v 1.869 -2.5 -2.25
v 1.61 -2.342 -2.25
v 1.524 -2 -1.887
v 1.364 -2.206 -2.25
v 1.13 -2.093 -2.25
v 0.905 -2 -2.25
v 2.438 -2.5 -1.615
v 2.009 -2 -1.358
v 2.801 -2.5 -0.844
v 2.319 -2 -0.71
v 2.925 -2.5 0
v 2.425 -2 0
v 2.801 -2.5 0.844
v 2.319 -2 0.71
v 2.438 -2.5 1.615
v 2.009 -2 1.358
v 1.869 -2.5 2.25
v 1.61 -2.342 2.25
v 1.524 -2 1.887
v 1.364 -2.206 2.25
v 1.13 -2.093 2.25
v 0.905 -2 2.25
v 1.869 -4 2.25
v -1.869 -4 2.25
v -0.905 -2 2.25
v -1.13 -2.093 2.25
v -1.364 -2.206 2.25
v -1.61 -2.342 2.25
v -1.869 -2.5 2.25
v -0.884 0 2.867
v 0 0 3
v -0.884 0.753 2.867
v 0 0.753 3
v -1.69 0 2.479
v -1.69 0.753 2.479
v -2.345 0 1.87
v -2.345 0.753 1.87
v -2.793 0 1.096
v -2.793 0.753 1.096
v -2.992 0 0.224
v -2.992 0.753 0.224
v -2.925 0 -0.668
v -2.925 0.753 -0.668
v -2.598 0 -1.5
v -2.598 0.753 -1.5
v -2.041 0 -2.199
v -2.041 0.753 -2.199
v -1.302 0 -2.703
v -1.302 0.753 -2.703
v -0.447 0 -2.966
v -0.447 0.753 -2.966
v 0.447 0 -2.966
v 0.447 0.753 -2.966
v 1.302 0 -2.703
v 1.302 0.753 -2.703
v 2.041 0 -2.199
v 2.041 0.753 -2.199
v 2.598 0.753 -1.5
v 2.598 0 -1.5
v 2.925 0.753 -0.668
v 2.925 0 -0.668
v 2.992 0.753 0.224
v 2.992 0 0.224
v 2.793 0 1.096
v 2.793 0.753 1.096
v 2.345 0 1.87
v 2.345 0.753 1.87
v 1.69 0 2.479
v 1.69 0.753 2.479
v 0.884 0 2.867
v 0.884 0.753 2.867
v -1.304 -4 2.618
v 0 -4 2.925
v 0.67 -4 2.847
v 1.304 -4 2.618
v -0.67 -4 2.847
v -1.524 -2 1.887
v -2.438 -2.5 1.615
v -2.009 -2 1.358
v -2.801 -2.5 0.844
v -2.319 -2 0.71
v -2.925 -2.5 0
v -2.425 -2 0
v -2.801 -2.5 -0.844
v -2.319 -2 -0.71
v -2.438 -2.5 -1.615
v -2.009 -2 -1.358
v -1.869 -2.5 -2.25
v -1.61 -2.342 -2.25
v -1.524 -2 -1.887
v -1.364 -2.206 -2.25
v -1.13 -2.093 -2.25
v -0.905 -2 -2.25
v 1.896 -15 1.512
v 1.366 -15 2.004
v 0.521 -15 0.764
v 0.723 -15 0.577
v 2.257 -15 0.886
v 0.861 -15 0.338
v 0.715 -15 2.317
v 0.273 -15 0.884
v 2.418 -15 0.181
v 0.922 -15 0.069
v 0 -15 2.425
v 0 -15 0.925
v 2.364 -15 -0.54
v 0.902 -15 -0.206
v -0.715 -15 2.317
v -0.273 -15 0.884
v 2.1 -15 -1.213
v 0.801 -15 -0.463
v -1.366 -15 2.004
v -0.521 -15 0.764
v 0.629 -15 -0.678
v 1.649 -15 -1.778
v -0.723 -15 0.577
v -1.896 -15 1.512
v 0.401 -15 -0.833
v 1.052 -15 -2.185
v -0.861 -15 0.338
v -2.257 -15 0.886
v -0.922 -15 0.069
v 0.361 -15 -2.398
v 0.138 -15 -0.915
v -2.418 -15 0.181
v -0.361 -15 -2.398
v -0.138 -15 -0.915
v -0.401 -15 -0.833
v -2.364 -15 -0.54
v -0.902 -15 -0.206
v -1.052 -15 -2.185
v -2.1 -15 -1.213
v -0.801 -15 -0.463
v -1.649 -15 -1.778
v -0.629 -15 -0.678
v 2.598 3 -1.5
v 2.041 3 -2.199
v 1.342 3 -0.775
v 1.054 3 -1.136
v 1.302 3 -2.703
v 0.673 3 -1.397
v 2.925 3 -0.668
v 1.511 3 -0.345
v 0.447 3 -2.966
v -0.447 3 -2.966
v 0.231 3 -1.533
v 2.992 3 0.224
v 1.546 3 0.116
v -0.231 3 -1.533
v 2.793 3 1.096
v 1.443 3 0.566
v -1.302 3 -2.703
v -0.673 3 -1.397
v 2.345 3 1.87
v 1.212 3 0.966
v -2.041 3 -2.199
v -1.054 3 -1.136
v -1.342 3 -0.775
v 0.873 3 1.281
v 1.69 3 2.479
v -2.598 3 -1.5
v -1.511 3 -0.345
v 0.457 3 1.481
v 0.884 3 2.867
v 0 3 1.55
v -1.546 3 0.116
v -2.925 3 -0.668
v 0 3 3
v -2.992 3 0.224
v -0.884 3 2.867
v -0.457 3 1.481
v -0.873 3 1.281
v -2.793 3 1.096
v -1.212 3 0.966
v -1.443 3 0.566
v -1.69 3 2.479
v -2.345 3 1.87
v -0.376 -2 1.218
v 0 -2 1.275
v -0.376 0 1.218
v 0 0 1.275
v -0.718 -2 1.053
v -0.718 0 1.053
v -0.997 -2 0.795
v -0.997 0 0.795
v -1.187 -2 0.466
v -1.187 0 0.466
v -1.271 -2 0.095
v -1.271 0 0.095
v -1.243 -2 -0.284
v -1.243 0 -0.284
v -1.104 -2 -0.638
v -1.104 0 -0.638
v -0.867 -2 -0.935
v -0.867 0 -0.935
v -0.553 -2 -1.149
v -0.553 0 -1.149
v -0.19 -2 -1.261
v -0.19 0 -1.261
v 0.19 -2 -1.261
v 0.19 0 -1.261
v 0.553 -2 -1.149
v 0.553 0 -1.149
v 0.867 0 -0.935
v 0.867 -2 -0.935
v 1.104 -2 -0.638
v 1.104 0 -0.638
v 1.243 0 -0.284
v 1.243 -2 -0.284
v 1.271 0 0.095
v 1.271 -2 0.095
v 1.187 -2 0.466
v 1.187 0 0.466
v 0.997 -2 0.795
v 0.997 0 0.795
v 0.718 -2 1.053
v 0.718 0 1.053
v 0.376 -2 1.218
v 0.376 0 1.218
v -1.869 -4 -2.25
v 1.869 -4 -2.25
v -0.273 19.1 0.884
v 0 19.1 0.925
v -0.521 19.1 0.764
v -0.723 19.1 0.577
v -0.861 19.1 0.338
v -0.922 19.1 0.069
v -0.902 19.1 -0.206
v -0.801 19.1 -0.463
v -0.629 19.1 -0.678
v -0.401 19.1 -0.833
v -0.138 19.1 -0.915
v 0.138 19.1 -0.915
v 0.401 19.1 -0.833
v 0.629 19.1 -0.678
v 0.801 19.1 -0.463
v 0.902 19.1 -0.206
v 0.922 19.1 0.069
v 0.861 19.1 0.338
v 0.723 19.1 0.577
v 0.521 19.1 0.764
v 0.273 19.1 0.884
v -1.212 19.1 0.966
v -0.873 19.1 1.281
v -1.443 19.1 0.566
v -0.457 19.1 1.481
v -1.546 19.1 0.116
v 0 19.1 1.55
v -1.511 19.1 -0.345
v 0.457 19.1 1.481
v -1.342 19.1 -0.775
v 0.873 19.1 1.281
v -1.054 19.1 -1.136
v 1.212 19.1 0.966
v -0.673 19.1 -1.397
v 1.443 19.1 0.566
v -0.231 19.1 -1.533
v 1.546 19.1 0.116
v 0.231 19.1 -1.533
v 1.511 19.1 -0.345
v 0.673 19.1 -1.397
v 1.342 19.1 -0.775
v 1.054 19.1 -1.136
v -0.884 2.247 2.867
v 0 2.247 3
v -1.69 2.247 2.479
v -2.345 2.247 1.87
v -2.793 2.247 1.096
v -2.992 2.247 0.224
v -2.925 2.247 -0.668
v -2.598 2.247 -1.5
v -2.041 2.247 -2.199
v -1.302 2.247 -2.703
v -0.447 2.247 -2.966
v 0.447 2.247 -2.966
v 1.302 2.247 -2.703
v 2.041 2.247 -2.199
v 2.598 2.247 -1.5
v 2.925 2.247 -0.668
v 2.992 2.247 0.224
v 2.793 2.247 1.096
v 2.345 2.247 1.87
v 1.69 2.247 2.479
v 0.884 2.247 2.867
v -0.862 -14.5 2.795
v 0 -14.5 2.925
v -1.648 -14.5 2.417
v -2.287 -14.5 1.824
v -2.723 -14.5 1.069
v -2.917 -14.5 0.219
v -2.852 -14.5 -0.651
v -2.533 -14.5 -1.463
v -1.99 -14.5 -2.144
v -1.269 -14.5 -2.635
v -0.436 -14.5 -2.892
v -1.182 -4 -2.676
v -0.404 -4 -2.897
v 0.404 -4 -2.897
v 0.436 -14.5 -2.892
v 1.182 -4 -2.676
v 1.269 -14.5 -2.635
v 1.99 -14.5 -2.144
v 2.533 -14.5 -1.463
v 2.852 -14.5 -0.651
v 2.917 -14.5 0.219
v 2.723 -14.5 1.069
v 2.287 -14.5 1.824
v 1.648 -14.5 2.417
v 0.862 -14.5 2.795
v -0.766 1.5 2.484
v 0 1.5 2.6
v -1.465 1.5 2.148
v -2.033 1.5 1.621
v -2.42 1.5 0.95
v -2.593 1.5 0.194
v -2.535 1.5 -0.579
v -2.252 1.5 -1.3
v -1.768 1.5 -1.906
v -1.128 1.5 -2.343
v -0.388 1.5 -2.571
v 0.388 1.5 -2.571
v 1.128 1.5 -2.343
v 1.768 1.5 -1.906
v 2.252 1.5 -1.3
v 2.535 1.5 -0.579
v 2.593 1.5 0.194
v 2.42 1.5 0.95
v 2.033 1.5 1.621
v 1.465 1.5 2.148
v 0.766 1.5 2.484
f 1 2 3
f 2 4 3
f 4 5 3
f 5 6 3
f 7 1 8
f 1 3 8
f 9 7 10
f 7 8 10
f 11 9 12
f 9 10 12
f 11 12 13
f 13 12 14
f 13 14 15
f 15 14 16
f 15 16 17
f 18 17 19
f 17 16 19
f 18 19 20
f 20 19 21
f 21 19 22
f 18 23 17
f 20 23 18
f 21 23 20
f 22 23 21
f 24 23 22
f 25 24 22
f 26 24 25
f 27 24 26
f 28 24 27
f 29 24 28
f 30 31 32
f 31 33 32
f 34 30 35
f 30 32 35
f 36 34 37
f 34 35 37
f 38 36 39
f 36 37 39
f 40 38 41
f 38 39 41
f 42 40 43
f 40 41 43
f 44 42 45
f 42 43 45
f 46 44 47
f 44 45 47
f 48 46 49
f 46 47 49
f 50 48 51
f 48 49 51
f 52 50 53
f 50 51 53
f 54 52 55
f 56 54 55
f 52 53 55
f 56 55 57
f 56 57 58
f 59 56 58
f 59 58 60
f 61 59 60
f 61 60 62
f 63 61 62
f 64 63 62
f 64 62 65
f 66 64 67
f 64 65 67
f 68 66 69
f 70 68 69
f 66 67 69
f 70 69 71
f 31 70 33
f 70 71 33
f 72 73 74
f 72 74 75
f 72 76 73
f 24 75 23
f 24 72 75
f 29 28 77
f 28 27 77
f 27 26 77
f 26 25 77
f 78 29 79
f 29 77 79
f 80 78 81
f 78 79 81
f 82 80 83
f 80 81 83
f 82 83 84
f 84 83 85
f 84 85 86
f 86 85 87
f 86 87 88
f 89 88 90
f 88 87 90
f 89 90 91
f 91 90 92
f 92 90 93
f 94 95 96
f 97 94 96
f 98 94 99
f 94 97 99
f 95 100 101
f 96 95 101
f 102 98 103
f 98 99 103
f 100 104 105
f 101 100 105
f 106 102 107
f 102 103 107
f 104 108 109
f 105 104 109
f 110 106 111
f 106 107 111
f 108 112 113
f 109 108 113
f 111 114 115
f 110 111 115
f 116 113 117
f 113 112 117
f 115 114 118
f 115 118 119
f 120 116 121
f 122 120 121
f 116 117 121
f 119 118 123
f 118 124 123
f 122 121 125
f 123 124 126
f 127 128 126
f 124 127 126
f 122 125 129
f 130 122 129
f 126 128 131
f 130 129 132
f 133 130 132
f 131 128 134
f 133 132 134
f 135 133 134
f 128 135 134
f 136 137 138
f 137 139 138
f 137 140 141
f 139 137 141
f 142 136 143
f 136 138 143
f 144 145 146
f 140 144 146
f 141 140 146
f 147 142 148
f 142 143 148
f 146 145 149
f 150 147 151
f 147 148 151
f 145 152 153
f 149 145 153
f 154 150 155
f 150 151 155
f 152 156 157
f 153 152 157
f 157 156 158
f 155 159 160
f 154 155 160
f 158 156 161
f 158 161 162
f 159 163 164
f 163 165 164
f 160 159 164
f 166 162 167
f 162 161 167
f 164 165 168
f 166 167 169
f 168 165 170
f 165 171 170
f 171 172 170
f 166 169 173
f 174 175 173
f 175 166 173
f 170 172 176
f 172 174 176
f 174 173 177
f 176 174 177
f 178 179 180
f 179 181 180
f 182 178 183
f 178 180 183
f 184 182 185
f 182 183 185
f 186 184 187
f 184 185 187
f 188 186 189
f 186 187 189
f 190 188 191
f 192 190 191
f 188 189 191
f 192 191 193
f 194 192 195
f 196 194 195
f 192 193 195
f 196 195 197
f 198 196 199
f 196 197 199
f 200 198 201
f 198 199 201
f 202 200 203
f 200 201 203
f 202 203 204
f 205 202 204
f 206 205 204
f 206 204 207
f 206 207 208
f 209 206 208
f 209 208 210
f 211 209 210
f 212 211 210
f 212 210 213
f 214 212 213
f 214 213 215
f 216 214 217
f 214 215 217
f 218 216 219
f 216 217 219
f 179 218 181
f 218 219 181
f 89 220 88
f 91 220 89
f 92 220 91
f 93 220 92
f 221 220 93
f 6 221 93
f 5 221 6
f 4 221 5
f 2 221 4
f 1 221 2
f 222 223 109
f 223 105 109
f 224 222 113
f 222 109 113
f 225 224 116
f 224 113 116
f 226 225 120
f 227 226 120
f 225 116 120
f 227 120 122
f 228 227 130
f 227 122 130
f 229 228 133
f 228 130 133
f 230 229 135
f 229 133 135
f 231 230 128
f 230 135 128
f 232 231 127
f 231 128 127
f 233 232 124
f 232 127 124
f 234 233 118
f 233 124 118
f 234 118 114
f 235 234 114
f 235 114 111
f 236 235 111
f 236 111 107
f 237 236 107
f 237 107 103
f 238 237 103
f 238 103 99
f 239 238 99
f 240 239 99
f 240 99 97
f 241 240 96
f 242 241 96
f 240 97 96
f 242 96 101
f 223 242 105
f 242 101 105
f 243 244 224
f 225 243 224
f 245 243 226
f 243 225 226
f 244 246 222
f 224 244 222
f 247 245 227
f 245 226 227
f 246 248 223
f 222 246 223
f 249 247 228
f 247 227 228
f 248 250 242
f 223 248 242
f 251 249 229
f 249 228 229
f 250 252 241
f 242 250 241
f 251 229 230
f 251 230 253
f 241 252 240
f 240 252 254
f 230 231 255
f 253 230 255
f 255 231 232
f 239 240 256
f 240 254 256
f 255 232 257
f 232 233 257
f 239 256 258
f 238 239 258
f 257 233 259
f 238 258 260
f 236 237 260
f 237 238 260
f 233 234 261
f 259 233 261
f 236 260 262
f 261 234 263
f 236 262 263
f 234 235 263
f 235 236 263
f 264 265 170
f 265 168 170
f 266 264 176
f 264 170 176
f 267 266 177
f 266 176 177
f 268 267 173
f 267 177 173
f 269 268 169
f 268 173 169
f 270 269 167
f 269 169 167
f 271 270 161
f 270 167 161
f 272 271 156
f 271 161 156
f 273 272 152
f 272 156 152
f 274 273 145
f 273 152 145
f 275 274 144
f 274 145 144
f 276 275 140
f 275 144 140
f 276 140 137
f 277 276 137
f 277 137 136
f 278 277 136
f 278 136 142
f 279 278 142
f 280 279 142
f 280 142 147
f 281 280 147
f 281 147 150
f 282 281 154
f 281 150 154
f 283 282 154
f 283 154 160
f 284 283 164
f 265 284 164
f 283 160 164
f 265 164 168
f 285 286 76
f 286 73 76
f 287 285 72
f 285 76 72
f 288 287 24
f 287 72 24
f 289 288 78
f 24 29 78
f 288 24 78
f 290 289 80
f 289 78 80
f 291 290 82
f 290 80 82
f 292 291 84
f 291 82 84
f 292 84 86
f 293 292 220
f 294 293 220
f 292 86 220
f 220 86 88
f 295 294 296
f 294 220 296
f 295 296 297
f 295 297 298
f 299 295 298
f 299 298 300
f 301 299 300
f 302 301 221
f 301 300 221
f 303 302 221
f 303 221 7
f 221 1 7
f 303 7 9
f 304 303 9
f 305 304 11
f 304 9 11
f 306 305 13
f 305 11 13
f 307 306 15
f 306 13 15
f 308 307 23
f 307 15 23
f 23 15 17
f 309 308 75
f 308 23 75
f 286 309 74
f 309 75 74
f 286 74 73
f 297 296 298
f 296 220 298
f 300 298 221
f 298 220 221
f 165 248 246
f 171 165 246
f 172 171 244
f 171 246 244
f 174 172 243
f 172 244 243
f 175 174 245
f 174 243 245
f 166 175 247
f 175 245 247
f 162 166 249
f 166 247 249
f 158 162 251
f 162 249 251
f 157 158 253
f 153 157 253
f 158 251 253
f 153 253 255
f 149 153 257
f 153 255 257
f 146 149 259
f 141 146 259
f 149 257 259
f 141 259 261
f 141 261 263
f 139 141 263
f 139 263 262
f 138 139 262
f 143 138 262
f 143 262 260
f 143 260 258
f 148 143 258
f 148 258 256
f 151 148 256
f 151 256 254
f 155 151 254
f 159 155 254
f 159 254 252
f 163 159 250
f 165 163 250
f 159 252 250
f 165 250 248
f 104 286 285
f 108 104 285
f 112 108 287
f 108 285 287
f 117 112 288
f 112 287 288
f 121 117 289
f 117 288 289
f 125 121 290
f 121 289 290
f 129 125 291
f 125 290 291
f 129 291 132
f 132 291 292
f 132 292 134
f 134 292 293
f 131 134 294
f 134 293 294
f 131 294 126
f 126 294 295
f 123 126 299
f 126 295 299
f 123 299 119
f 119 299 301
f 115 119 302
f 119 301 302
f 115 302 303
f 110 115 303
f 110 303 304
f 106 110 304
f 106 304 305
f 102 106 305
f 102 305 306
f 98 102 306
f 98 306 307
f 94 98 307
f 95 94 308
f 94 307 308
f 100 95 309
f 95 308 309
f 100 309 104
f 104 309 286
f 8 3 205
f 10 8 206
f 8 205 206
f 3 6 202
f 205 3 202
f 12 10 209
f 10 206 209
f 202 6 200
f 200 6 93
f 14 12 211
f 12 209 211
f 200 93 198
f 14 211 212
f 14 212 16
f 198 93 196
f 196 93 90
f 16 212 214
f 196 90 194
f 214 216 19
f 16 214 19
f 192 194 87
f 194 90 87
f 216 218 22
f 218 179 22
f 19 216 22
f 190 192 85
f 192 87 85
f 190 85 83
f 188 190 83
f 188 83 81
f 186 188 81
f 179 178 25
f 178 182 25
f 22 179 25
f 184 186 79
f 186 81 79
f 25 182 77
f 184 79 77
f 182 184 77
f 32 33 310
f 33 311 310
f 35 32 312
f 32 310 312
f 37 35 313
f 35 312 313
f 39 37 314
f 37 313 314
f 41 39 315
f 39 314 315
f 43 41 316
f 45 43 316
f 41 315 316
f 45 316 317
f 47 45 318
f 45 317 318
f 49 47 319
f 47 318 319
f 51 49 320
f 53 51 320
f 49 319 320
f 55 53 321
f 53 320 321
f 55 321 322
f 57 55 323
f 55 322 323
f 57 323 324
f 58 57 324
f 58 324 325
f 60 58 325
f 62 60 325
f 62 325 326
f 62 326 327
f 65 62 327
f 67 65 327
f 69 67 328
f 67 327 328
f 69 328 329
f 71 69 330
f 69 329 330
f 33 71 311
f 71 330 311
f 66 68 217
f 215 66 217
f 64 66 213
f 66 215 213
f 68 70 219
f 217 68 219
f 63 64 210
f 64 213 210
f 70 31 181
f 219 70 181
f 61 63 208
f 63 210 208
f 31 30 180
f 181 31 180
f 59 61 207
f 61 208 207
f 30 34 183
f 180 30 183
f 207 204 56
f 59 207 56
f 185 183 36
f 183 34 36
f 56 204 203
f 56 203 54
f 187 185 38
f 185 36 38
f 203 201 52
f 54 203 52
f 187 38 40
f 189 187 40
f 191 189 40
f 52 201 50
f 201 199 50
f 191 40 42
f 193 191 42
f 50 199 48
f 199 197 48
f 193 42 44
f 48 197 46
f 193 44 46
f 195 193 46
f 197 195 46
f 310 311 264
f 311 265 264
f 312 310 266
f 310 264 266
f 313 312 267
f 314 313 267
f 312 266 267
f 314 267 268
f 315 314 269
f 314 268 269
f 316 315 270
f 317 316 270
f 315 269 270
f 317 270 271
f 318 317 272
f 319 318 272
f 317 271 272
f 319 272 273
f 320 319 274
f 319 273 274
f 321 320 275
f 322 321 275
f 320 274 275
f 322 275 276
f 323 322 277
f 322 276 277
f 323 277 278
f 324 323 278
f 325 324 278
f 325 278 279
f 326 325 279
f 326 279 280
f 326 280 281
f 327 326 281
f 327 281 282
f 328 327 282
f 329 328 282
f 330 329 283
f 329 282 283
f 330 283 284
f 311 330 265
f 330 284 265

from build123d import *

# Parameters (mm, degrees)
CHAMFER1_SIZE      = 0.5
SKETCH2_W          = 2
SKETCH2_H          = 2
CUT_EXTRUDE1_DEPTH = 3
SKETCH3_W          = 6
SKETCH3_H          = 5
CUT_EXTRUDE2_DEPTH = 3


with BuildPart() as part:
    # Sketch1 → Revolve1 (revolve)
    with BuildSketch(Plane(origin=(0, 0, 0), x_dir=(0, 0, -1), z_dir=(1, 0, 0)), mode=Mode.PRIVATE) as revolve1_sk:
        Polygon((0.925, 24.1), (0.925, -15), (2.925, -15), (2.925, -2), (1.275, -2), (1.275, 0), (3, 0), (3, 0.753), (2.6, 1.5), (3, 2.247), (3, 3), (1.55, 3), (1.55, 24.1), align=None)
    revolve(revolve1_sk.sketch.rotate(Axis((0, 26.094339623, 0), (0, -1, 0)), 180), axis=Axis((0, 26.094339623, 0), (0, -1, 0)))

    # Chamfer1
    chamfer1_edges = [part.edges().sort_by_distance(p)[0] for p in [
        (0, -2, -2.925),
        (0, -15, -2.925),
    ]]
    chamfer(chamfer1_edges, length=CHAMFER1_SIZE)

    # Sketch2 → Cut-Extrude1 (cut, symmetric)
    with BuildSketch(Plane(origin=(0, 0, 0), x_dir=(0, 0, -1), z_dir=(1, 0, 0))):
        with Locations((-3.25, -3)):
            Rectangle(SKETCH2_W, SKETCH2_H)
        with Locations((3.25, -3)):
            Rectangle(SKETCH2_W, SKETCH2_H)
    extrude(amount=CUT_EXTRUDE1_DEPTH, both=True, mode=Mode.SUBTRACT)

    # Sketch3 → Cut-Extrude2 (cut, symmetric)
    with BuildSketch(Plane(origin=(0, 0, 0), x_dir=(0, 0, -1), z_dir=(1, 0, 0))):
        with Locations((0, 21.6)):
            Rectangle(SKETCH3_W, SKETCH3_H)
    extrude(amount=CUT_EXTRUDE2_DEPTH, both=True, mode=Mode.SUBTRACT)


solid = part.part
